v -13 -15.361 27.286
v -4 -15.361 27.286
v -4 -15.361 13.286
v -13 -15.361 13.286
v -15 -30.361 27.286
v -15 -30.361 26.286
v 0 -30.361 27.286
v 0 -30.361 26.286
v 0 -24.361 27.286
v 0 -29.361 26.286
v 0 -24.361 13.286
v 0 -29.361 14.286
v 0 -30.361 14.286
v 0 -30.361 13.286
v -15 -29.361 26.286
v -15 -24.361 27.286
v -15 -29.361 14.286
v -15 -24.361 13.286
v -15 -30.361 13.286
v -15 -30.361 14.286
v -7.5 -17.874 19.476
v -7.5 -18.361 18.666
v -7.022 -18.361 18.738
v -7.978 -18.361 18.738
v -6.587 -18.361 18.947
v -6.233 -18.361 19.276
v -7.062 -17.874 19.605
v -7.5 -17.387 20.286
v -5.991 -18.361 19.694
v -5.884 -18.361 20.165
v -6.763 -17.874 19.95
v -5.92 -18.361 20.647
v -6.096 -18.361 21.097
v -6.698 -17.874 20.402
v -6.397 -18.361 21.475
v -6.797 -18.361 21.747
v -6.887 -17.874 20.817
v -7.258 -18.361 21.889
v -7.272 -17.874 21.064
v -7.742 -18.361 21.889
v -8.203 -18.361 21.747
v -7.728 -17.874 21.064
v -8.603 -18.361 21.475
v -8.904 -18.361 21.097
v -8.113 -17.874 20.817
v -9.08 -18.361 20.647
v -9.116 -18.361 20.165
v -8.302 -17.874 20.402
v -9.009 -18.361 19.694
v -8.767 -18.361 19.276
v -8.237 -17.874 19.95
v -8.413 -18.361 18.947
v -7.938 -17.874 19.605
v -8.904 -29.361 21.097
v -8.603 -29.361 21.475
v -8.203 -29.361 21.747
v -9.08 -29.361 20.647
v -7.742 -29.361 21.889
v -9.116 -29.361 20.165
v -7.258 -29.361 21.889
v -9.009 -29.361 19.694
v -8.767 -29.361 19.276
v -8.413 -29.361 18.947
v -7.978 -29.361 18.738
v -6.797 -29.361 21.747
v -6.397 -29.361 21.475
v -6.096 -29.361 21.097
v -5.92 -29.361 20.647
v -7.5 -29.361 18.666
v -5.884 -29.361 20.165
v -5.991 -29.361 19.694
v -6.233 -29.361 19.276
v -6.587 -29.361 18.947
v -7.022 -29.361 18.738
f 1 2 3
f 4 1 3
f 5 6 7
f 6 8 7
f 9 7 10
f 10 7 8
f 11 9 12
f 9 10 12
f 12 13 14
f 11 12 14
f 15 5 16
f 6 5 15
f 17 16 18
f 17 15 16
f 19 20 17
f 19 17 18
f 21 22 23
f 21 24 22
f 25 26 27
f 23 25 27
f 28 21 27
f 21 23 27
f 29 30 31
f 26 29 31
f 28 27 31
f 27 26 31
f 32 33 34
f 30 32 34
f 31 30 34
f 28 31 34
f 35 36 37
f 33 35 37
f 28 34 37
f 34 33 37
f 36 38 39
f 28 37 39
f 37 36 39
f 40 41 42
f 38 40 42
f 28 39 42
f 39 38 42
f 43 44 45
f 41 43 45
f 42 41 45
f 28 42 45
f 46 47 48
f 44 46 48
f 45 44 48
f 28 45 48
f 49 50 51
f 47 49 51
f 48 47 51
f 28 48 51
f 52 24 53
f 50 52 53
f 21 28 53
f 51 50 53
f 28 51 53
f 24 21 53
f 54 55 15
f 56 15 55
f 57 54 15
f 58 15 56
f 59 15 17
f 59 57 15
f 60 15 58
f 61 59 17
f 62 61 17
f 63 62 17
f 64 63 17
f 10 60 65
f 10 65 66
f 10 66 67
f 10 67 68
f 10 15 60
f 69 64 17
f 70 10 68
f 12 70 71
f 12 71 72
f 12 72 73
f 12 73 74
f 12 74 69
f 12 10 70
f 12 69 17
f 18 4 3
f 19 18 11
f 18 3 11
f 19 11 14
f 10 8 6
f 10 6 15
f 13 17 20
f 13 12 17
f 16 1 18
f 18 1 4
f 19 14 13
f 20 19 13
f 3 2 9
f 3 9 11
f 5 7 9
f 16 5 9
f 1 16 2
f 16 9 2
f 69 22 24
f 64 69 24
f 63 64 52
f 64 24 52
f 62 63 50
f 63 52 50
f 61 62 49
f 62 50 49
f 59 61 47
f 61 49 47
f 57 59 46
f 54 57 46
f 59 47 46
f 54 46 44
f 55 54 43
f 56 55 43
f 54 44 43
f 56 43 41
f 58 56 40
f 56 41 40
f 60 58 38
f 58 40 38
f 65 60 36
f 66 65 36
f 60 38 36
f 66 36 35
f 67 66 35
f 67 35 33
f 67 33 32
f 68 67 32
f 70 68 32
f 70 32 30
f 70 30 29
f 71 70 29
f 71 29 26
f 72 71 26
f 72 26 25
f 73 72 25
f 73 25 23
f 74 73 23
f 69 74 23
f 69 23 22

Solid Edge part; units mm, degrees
sketch "Sketch1" plane through (0, 0, 0) normal (1, 0, 0) x (0, 1, 0)
  line L0 (-30.361, 27.2865) -> (-15.361, 27.2865)
  line L1 (-15.361, 27.2865) -> (-15.361, 13.2865)
  line L2 (-15.361, 13.2865) -> (-30.361, 13.2865)
  line L3 (-30.361, 13.2865) -> (-30.361, 27.2865)
  dimension "D1" = 15
  dimension "D2" = 14
extrude "Protrusion1" add sketch "Sketch1" against normal blind 15
sketch "Sketch2" plane through (0, -22.861, 20.2865) normal (1, 0, 0) x (0, 1, 0)
  line L0 (-7.5, 6) -> (-6.5, 6)
  line L1 (-6.5, 6) -> (-6.5, -6)
  line L2 (-6.5, -6) -> (-7.5, -6)
  line L3 (-7.5, -6) -> (-7.5, 6)
  dimension "D1" = 1
  dimension "D2" = 1
  dimension "D3" = 1
extrude "Cutout1" cut sketch "Sketch2" against normal through all
chamfer "afschuin9x4" distance 9 distance2 4 1 edges at (0, -15.361, 20.2865) measured on face at (0, -18.011, 25.0932)
chamfer "Chamfer_4" distance 9 distance2 2 1 edges at (-15, -15.361, 20.2865) measured on face at (-15, -18.011, 25.0932)
hole "schroefdraadM4" at (-7.5, -29.361, 20.2865) direction (0, 1, 0) diameter 3.242 depth 11 tip angle 118 thread major 4 thread length 7
